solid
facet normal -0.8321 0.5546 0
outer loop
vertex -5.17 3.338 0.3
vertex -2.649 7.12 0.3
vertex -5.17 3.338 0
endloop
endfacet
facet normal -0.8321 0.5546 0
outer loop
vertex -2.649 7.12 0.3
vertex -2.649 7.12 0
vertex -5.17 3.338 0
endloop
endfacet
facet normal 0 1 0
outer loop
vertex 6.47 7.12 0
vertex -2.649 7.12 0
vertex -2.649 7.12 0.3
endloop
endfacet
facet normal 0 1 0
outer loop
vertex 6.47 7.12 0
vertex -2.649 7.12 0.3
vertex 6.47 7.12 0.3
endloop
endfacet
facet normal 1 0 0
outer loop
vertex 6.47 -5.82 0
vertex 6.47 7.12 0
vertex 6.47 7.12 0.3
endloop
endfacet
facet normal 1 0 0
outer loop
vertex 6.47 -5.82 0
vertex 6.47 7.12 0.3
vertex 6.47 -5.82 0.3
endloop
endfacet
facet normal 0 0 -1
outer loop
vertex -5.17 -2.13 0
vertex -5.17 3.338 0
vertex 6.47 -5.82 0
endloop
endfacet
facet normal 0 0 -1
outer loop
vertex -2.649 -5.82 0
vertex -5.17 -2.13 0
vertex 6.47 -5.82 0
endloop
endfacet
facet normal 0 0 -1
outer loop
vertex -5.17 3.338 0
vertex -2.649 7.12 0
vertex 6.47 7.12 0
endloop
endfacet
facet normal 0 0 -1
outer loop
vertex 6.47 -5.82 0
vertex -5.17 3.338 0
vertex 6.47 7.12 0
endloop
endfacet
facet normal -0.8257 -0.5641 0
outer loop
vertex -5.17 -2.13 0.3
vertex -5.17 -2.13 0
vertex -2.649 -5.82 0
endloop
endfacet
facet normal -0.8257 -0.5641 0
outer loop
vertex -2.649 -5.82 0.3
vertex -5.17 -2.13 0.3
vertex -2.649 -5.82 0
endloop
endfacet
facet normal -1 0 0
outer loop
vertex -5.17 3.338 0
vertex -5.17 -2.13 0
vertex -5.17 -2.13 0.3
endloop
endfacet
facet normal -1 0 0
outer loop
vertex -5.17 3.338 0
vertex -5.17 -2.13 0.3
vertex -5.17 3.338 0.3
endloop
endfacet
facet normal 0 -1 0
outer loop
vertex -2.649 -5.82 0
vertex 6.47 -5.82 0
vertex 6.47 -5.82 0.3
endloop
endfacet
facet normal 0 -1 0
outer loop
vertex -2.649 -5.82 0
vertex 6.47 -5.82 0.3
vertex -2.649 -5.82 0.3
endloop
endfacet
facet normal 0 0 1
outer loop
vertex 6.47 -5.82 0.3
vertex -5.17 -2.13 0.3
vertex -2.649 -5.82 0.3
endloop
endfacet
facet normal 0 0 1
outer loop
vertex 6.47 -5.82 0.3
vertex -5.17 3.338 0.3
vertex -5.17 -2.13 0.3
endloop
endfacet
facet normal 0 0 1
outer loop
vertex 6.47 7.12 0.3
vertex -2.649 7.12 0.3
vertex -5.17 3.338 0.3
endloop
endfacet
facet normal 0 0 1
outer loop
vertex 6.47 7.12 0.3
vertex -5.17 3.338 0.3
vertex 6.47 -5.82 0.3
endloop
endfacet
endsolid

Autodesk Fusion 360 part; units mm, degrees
sketch "Sketch1" plane through (0, 0, 0) normal (0, 0, 1) x (1, 0, 0)
  line L0 (6.47, -5.82) -> (-6.47, -5.82)
  line L1 (-6.47, -5.82) -> (-6.47, 5.82)
  line L2 (-6.47, 5.82) -> (6.47, 5.82)
  line L3 (6.47, 5.82) -> (6.47, -5.82)
  line L4 (6.47, -5.82) -> (-6.47, 5.82) construction
  line L5 (-6.47, -5.82) -> (6.47, 5.82) construction
  line L6 (6.47, -5.82) -> (-6.47, -5.82)
  line L7 (-6.47, -5.82) -> (-6.47, 3.338)
  line L8 (-6.47, 3.338) -> (6.47, 3.338)
  line L9 (6.47, 3.338) -> (6.47, -5.82)
  line L10 (6.47, 3.338) -> (-6.47, 3.338)
  line L11 (-6.47, 3.338) -> (-6.47, -2.13)
  line L12 (-6.47, -2.13) -> (6.47, -2.13)
  line L13 (6.47, -2.13) -> (6.47, 3.338)
  line L14 (6.47, -5.82) -> (-2.649, -5.82)
  line L15 (-2.649, -5.82) -> (-2.649, 5.82)
  line L16 (-2.649, 5.82) -> (6.47, 5.82)
  line L17 (6.47, 5.82) -> (6.47, -5.82)
  line L18 (-2.649, -5.82) -> (-5.17, -5.82)
  line L19 (-5.17, -5.82) -> (-5.17, -2.13)
  line L20 (-5.17, -2.13) -> (-2.649, -2.13)
  line L21 (-2.649, -2.13) -> (-2.649, -5.82)
  line L22 (-2.649, 3.338) -> (-5.17, 3.338)
  line L23 (-5.17, 3.338) -> (-5.17, 5.82)
  line L24 (-5.17, 5.82) -> (-2.649, 5.82)
  line L25 (-2.649, 5.82) -> (-2.649, 3.338)
  line L26 (6.47, -5.82) -> (-5.17, -5.82)
  line L27 (-5.17, -5.82) -> (-5.17, 7.12)
  line L28 (-5.17, 7.12) -> (6.47, 7.12)
  line L29 (6.47, 7.12) -> (6.47, -5.82)
  line L30 (-2.649, 5.82) -> (-2.649, 7.12)
  line L31 (-2.649, 7.12) -> (-5.17, 3.338)
  line L32 (-5.17, -2.13) -> (-2.649, -5.82)
  dimension "d1" = 12.94
  dimension "d2" = 11.64
  dimension "d3" = 9.158
  dimension "d4" = 5.468
  dimension "d5" = 9.119
  dimension "d6" = 2.521
  dimension "d7" = 2.521
  dimension "d8" = 12.94
extrude "Extrude1" add sketch "Sketch1" along normal blind 0.1 contours L0 L3 L6 L9 L12 L14 L15 L17 L21 L26 L29 | L12 L15 L20 L21 L32 | L3 L8 L9 L10 L12 L13 L15 L17 L29 | L8 L10 L12 L15 L20 L22 L27 | L2 L3 L8 L10 L15 L16 L17 L25 L29 | L2 L8 L10 L15 L22 L24 L25 L31 | L2 L16 L28 L29 L30 | L2 L24 L30 L31
extrude "Extrude2" add 1 faces at (2.59, 1.546, 0.1) along direction (0, 0, 1) blind 0.2
